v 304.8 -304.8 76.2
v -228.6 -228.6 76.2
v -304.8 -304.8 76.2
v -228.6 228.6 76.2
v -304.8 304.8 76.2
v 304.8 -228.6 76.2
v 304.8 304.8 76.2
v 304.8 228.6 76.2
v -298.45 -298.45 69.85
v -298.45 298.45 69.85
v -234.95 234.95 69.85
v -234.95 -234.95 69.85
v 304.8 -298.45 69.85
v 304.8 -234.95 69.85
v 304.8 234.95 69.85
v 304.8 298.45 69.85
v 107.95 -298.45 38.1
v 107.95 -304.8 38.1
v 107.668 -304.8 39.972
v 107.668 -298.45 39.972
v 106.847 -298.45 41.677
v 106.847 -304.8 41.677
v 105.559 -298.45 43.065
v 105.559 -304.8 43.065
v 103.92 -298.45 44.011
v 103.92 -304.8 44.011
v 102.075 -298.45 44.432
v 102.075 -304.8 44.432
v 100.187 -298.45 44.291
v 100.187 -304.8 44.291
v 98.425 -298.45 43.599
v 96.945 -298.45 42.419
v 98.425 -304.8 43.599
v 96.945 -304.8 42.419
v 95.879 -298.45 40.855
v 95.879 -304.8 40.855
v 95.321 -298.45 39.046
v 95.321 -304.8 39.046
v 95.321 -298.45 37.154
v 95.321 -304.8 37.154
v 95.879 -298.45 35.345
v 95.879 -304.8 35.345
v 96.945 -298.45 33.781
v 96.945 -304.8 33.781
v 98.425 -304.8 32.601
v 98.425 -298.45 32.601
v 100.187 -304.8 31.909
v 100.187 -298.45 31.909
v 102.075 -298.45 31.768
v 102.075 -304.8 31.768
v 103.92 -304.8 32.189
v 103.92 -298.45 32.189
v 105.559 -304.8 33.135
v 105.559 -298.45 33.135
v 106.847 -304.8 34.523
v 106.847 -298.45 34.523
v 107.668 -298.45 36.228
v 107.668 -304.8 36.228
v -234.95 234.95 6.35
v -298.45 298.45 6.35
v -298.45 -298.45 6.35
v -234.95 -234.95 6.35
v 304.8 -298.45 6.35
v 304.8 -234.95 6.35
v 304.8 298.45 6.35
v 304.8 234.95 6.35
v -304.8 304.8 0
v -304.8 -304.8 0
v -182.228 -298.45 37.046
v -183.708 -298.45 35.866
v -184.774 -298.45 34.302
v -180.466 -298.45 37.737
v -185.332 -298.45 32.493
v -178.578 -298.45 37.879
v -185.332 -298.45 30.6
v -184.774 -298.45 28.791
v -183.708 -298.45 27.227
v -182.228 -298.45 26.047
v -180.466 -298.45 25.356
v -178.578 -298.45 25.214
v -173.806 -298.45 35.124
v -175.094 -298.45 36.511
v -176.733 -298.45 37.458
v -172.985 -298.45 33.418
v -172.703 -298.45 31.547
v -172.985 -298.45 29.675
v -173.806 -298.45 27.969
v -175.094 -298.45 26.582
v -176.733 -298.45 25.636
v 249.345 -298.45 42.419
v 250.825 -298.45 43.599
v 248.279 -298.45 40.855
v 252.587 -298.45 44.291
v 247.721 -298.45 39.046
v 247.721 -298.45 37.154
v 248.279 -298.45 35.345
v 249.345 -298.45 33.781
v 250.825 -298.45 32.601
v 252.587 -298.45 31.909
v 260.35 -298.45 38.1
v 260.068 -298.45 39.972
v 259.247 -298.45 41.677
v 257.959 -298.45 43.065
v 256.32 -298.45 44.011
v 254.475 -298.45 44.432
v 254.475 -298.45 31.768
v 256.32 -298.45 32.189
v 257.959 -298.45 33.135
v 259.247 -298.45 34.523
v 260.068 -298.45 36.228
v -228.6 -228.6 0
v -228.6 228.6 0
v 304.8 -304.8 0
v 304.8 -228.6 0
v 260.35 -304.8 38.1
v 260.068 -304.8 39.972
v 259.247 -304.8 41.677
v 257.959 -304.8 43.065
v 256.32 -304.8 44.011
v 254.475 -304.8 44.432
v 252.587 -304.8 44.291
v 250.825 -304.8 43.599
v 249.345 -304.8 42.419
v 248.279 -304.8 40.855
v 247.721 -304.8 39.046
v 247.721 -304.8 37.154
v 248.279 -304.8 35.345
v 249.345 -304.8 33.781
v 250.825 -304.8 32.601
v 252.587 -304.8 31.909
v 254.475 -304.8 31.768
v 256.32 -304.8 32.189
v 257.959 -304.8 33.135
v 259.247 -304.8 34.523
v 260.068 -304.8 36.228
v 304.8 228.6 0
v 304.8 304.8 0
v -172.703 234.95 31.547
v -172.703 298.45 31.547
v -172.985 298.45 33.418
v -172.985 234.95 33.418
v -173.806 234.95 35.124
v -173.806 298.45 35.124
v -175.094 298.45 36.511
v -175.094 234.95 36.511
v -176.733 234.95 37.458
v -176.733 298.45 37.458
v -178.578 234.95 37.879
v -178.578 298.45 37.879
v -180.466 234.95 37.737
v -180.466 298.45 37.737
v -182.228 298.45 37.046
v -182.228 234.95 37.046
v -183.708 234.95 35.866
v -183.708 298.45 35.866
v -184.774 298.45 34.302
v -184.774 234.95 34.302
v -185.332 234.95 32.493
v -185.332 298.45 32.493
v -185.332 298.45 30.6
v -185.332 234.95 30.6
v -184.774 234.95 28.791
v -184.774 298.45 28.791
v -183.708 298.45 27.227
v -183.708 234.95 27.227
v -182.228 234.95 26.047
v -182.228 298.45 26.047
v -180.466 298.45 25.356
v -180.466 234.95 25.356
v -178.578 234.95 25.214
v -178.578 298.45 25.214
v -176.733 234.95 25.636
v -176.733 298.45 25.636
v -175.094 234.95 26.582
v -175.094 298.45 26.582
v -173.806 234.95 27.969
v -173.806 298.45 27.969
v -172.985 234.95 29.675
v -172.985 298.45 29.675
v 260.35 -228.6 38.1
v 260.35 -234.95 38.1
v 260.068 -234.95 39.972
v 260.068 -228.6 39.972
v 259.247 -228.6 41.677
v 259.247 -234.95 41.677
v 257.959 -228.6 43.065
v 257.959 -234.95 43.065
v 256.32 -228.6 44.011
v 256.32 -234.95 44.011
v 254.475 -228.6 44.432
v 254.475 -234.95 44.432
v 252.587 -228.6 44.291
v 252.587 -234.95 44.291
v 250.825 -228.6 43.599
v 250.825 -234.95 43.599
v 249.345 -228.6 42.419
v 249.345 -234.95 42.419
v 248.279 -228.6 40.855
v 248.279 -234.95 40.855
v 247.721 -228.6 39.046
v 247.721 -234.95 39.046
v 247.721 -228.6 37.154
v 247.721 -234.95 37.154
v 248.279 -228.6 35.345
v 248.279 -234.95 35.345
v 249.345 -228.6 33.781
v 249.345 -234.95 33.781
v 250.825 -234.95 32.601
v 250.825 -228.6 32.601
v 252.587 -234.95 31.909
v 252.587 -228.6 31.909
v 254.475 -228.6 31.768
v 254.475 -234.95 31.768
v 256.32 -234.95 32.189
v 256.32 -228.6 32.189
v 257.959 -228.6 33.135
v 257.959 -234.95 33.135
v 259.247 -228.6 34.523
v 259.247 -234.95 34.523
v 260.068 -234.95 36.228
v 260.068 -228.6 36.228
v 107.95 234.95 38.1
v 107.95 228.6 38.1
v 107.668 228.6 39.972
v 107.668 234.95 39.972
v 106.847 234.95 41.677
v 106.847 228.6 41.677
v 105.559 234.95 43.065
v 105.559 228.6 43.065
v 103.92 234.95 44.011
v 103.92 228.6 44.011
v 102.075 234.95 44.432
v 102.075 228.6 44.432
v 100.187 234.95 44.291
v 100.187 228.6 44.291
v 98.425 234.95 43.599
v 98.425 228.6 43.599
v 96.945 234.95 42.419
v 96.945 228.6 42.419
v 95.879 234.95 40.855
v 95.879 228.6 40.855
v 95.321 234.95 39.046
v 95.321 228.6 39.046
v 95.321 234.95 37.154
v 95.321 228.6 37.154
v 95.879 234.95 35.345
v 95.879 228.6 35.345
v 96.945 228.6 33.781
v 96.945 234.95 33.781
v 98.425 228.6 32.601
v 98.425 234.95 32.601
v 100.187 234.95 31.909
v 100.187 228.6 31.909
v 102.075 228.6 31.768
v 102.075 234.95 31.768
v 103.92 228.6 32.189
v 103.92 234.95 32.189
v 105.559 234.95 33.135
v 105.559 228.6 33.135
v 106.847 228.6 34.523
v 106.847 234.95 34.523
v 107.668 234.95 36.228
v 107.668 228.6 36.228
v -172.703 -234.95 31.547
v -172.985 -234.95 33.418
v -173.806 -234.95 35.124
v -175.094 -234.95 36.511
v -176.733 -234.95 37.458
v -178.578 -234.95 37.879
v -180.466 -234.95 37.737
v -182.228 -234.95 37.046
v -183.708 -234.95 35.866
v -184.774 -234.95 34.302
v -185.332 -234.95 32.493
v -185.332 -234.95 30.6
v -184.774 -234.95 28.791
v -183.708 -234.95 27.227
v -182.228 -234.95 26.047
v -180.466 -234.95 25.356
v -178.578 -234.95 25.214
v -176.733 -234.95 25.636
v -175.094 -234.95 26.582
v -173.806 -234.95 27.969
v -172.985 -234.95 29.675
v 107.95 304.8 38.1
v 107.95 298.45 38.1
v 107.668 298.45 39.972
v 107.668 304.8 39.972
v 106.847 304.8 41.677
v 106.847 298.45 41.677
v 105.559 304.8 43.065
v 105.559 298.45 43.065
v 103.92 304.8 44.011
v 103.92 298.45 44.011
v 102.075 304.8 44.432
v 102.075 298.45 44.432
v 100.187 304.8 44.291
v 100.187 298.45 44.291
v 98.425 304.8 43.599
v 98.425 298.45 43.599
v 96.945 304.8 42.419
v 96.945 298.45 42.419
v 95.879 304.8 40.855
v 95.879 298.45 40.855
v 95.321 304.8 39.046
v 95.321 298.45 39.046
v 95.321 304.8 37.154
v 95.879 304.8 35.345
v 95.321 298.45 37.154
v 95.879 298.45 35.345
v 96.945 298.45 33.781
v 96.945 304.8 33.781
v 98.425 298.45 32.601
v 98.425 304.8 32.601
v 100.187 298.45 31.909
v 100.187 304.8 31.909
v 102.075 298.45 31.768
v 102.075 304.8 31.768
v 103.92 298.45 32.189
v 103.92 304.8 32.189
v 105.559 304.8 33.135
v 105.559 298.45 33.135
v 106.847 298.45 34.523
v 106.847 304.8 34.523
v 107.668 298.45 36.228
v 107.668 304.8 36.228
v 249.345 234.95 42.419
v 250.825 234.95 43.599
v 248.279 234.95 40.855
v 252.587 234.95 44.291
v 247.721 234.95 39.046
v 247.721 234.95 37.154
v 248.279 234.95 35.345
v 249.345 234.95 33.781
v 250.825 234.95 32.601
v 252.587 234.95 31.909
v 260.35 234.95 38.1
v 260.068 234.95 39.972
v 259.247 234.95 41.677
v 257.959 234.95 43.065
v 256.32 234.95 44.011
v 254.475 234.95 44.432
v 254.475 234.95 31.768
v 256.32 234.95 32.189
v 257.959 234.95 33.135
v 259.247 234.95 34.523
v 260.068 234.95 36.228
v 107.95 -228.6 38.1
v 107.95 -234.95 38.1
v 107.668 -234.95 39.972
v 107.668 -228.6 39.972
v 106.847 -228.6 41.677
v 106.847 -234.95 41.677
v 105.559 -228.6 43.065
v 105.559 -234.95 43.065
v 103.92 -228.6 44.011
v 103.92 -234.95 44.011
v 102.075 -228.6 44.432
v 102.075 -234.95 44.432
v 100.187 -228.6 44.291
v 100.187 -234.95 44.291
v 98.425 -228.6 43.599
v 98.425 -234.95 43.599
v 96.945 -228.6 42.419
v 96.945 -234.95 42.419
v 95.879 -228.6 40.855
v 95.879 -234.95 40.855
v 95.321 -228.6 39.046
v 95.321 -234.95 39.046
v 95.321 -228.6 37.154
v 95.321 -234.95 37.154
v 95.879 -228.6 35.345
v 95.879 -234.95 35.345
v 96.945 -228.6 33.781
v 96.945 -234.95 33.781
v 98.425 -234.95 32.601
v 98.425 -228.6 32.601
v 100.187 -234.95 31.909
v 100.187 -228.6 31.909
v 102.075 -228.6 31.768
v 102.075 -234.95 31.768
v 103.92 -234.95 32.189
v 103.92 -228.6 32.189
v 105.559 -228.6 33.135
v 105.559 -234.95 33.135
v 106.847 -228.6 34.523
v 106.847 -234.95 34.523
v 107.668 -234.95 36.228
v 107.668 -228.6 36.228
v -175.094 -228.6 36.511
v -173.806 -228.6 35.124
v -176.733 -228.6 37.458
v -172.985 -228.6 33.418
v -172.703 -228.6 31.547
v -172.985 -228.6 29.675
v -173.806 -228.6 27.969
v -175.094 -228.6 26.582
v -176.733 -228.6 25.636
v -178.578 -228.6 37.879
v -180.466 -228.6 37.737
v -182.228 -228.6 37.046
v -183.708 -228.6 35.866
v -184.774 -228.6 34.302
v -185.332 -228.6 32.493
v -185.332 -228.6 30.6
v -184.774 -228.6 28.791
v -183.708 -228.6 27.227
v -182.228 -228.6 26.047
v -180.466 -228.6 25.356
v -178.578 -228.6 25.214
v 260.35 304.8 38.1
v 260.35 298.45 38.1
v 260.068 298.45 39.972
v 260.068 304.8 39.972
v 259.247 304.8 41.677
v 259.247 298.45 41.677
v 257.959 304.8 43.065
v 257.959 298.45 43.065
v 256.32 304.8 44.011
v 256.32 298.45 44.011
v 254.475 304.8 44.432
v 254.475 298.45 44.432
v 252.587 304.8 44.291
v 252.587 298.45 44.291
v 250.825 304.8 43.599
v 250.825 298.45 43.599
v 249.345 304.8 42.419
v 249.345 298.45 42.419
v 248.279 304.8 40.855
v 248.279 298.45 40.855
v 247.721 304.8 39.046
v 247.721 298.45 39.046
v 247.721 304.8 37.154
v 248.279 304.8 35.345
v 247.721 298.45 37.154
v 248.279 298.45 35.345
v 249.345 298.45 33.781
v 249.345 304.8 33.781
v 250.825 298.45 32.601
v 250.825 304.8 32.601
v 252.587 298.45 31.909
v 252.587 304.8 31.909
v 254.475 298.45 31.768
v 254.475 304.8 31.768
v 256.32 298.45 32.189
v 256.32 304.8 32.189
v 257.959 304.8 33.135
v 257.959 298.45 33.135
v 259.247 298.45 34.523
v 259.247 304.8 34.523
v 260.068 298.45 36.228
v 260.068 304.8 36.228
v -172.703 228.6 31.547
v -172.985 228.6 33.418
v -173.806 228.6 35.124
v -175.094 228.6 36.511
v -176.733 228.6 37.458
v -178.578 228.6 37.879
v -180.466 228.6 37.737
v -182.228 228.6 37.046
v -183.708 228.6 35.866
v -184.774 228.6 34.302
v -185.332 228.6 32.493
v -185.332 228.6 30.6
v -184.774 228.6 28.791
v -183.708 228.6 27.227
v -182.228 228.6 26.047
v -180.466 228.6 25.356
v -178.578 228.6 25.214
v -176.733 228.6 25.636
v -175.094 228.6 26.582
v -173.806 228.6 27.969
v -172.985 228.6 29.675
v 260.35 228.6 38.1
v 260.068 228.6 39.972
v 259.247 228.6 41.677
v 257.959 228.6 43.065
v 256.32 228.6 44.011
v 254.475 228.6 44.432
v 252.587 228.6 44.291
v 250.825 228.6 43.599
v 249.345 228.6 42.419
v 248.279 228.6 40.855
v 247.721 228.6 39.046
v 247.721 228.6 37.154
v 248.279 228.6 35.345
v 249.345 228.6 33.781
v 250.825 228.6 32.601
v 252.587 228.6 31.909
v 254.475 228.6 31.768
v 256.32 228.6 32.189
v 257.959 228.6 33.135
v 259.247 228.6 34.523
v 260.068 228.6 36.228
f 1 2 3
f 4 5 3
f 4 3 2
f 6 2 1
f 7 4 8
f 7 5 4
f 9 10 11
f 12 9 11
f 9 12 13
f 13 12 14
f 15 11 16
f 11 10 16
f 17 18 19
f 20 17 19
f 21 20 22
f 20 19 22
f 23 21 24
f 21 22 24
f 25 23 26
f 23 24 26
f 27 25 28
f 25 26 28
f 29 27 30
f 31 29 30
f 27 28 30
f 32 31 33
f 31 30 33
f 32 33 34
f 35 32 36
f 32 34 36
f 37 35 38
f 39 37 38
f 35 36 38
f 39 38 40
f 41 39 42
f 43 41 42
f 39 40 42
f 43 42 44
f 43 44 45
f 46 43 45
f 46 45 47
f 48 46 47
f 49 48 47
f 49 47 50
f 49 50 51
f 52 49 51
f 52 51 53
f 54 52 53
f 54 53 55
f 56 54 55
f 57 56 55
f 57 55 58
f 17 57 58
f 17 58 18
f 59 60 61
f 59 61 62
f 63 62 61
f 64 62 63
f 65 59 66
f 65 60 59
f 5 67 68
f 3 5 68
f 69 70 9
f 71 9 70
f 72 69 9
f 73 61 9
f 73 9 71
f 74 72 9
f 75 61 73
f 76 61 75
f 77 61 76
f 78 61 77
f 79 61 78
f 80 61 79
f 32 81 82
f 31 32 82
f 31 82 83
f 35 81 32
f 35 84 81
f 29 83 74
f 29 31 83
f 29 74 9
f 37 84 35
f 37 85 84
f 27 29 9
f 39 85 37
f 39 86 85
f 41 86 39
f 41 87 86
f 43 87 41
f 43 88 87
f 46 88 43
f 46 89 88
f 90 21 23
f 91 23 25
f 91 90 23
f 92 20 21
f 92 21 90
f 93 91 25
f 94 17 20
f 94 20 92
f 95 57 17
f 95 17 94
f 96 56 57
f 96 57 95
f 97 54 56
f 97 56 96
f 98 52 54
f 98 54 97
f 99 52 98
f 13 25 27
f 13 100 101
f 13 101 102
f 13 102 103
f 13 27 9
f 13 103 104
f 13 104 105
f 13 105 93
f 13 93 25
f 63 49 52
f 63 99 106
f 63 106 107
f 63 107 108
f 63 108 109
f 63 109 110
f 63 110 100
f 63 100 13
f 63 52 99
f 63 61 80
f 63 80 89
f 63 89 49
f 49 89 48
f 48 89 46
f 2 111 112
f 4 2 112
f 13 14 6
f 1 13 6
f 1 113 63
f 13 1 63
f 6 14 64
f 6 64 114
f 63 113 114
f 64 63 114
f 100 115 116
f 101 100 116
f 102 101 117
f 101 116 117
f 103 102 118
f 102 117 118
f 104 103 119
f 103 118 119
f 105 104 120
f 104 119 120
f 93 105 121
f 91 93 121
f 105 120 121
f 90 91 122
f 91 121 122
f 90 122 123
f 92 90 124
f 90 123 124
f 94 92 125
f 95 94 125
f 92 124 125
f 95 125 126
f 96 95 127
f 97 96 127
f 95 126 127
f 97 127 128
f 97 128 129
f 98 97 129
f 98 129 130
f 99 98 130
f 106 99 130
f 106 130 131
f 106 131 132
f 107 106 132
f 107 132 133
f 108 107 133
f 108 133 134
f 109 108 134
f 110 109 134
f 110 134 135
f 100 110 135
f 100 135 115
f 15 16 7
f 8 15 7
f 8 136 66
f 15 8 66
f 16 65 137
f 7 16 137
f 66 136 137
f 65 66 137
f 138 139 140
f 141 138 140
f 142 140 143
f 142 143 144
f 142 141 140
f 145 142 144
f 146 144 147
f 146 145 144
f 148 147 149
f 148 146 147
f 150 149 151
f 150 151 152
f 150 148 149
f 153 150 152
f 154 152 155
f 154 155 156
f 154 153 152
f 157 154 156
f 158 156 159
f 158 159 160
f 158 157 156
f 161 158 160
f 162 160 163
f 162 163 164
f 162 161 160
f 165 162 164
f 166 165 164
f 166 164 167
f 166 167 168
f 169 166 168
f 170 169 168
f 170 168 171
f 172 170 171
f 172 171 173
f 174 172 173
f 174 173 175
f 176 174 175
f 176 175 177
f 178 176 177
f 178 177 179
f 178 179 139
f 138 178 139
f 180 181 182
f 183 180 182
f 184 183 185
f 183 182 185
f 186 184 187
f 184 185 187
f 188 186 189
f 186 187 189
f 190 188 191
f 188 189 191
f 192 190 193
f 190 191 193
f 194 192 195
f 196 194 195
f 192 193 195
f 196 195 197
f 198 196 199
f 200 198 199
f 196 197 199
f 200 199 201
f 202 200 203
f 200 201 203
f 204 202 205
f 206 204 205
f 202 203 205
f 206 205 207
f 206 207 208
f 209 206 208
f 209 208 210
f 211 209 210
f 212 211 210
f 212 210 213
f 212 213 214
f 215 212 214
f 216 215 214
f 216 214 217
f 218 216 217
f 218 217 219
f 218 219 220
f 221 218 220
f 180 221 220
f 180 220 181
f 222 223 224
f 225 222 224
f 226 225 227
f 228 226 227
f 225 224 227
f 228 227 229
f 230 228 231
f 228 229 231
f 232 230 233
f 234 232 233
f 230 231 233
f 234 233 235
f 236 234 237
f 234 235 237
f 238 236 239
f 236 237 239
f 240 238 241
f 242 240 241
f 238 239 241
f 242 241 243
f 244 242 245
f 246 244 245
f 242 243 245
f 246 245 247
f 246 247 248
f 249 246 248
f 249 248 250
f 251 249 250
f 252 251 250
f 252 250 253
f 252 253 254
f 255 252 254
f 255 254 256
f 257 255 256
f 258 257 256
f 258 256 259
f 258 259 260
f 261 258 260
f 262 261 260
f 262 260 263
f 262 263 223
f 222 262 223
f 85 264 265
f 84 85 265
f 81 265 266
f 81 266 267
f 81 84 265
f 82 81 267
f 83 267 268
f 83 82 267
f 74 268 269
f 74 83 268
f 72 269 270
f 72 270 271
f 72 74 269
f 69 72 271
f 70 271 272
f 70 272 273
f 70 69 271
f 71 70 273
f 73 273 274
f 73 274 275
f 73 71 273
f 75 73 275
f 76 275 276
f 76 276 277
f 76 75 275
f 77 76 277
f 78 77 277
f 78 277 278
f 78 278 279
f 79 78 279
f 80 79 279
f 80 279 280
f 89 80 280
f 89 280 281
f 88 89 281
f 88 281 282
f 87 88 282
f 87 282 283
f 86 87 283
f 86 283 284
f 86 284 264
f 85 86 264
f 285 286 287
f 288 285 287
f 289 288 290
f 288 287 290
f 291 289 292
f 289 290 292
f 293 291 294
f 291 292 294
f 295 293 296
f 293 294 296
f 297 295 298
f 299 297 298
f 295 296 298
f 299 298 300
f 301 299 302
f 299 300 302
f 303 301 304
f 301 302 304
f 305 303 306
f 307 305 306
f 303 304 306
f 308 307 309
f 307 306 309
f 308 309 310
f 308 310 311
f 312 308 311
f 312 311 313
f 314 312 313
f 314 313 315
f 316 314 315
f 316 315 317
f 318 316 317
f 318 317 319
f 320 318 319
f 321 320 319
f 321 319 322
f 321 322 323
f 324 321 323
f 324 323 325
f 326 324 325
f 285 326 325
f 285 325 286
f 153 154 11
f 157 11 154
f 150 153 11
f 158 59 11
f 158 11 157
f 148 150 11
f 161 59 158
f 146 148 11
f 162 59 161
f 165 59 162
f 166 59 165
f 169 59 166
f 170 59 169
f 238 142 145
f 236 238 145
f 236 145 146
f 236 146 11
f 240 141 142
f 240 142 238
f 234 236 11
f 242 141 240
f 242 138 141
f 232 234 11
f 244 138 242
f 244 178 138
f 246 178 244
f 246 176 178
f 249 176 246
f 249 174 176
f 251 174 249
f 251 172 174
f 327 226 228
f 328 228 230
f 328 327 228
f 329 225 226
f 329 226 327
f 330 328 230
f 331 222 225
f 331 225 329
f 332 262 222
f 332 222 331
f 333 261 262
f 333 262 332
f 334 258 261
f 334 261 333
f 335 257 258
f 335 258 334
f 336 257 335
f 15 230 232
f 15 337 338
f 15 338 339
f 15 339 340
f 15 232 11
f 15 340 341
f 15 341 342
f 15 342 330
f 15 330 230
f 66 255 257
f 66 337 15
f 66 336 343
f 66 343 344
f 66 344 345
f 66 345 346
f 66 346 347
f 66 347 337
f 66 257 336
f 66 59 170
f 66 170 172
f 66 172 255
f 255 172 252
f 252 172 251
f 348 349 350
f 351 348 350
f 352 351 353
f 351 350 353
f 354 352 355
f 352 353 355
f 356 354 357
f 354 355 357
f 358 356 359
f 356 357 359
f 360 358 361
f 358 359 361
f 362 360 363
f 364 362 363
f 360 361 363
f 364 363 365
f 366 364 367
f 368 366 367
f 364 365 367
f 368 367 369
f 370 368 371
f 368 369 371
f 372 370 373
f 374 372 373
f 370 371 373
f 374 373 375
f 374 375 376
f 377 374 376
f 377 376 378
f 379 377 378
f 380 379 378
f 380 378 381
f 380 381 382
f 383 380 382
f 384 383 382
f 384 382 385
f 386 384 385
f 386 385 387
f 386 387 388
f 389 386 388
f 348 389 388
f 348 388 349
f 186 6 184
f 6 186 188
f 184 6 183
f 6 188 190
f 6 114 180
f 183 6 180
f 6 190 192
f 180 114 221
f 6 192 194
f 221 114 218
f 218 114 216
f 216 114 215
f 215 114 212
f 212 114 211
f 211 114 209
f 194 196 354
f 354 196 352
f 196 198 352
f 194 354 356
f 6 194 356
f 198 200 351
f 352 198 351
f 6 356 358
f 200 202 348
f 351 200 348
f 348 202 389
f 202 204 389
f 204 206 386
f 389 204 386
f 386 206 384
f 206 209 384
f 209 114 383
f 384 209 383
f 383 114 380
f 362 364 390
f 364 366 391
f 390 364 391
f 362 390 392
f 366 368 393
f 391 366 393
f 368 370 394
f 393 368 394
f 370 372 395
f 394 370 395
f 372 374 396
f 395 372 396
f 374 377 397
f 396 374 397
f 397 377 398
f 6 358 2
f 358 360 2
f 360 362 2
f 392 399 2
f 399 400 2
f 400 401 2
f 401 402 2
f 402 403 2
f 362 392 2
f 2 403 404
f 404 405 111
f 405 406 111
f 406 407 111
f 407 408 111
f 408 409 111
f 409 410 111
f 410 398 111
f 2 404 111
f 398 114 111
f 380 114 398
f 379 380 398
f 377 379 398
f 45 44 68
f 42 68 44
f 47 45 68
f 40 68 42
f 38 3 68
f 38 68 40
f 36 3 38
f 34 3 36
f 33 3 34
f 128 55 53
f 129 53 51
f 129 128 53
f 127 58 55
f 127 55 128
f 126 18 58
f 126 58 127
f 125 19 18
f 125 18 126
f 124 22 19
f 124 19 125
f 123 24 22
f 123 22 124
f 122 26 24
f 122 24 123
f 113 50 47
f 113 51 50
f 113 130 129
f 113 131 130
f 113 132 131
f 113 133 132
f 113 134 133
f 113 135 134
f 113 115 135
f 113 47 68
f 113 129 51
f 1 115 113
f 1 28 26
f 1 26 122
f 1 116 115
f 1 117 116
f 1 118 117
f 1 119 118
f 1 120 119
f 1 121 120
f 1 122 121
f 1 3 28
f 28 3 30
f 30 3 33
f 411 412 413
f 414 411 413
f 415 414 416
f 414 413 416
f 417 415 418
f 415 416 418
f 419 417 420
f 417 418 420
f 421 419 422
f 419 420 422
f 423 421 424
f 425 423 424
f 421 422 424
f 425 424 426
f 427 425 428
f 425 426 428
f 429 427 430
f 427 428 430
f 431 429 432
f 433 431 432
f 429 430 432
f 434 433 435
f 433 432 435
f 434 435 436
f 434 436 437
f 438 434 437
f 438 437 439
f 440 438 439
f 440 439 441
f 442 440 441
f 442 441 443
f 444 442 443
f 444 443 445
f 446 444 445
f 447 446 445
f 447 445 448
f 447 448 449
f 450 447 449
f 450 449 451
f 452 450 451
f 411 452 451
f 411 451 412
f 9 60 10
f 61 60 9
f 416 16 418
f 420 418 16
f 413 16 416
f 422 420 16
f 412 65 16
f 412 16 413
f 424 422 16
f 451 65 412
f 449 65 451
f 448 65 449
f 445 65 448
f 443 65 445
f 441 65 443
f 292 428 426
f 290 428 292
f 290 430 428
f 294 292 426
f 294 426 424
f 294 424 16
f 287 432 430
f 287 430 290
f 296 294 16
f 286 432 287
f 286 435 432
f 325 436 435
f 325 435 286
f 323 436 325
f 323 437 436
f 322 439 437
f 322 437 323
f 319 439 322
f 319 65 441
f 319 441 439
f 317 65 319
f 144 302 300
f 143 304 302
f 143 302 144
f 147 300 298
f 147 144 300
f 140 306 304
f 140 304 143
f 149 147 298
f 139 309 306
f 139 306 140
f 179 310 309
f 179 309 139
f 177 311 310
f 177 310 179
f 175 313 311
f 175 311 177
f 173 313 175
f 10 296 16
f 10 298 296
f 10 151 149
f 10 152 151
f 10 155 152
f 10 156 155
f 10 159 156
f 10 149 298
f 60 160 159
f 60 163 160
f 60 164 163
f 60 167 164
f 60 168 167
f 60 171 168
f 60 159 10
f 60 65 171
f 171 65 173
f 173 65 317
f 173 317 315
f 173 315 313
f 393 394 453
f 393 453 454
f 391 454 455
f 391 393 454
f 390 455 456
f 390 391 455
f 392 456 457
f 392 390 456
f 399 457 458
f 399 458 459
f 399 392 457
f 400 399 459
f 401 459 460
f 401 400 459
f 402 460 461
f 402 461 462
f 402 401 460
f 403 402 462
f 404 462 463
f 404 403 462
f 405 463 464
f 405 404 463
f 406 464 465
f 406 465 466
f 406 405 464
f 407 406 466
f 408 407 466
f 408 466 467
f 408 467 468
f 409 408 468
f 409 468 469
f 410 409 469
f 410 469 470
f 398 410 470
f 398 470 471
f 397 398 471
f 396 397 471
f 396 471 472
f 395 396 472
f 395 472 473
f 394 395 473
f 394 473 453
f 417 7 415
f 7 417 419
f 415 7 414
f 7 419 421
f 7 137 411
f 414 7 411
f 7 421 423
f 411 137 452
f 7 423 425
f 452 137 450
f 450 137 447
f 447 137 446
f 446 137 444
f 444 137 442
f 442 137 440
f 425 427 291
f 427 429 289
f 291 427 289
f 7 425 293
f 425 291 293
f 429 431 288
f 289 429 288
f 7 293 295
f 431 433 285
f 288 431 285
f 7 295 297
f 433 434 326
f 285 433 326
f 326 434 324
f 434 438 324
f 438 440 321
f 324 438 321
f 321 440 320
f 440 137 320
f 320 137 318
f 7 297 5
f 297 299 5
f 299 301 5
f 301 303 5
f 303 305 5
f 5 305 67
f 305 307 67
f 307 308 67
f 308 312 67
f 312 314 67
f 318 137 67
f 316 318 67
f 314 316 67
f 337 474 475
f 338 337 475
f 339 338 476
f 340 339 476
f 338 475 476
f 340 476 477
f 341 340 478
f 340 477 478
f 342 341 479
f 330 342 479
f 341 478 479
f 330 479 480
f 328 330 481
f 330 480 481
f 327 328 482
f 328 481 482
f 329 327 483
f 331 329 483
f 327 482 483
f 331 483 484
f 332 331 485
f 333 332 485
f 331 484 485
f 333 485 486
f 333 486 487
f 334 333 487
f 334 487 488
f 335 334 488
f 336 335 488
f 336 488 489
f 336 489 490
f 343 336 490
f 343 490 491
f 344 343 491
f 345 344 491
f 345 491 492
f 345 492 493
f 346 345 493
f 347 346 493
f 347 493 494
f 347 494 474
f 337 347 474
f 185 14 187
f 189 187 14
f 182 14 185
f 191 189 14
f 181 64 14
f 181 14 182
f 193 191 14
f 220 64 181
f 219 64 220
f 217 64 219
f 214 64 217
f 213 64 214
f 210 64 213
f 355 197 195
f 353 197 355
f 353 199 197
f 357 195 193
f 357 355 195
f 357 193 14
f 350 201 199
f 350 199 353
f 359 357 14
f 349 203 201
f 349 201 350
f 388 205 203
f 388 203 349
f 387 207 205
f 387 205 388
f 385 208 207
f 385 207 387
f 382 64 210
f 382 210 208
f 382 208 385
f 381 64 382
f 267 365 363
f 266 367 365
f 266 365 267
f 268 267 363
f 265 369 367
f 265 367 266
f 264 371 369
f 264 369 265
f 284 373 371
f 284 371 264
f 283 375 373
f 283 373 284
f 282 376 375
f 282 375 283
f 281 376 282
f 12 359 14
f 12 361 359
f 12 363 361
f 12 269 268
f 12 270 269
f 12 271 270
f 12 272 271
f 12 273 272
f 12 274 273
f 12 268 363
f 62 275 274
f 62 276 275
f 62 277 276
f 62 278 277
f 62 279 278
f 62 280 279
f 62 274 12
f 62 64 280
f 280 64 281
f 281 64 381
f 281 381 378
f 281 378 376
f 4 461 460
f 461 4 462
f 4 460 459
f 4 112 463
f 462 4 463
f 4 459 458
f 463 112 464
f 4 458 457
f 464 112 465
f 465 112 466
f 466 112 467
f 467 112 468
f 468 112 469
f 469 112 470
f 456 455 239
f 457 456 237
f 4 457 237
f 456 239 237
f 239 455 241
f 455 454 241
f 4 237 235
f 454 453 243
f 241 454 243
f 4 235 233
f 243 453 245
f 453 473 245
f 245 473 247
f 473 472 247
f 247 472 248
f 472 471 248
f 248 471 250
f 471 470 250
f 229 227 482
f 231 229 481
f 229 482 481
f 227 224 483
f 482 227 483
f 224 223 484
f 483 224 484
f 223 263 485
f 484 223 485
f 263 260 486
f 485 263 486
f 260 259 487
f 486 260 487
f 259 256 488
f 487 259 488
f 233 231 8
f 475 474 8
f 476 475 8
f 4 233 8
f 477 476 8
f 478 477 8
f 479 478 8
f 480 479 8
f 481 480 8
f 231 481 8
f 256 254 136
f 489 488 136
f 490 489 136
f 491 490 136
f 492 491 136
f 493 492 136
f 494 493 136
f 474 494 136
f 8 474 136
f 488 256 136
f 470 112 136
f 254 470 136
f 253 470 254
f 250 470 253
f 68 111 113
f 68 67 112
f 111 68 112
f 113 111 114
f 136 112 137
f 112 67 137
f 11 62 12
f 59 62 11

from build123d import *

# Parameters (mm, degrees)
F1_DEPTH = 76.2
F2_T     = -6.35
F3_R     = 6.35
F4_DEPTH = 609.6
F6_D     = 12.7


with BuildPart() as f1:
    # F0 (on Top) → F1 (new body)
    with BuildSketch(Plane.XY):
        Polygon((-304.8, 304.8), (-304.8, -304.8), (304.8, -304.8), (304.8, -228.6), (-228.6, -228.6), (-228.6, 228.6), (304.8, 228.6), (304.8, 304.8), align=None)
    extrude(amount=F1_DEPTH)

    # F2
    f2_openings = [f1.faces().sort_by_distance(p)[0] for p in [
        (304.8, -266.7, 38.1),
        (304.8, 266.7, 38.1),
    ]]
    offset(amount=F2_T, openings=f2_openings, kind=Kind.INTERSECTION)

    # F3 (on face) → F4 (join)
    with BuildSketch(Plane.XZ.offset(304.8)):
        with Locations((-179.052978754, 31.5465517342)):
            Circle(F3_R)
    extrude(amount=-F4_DEPTH)

    # F6 (through all)
    with Locations(Plane(origin=(0, 304.8, 0), x_dir=(-1, 0, 0), z_dir=(0, 1, 0))):
        with Locations((-254, 38.1), (-101.6, 38.1)):
            Hole(F6_D / 2)


solid = f1.part
